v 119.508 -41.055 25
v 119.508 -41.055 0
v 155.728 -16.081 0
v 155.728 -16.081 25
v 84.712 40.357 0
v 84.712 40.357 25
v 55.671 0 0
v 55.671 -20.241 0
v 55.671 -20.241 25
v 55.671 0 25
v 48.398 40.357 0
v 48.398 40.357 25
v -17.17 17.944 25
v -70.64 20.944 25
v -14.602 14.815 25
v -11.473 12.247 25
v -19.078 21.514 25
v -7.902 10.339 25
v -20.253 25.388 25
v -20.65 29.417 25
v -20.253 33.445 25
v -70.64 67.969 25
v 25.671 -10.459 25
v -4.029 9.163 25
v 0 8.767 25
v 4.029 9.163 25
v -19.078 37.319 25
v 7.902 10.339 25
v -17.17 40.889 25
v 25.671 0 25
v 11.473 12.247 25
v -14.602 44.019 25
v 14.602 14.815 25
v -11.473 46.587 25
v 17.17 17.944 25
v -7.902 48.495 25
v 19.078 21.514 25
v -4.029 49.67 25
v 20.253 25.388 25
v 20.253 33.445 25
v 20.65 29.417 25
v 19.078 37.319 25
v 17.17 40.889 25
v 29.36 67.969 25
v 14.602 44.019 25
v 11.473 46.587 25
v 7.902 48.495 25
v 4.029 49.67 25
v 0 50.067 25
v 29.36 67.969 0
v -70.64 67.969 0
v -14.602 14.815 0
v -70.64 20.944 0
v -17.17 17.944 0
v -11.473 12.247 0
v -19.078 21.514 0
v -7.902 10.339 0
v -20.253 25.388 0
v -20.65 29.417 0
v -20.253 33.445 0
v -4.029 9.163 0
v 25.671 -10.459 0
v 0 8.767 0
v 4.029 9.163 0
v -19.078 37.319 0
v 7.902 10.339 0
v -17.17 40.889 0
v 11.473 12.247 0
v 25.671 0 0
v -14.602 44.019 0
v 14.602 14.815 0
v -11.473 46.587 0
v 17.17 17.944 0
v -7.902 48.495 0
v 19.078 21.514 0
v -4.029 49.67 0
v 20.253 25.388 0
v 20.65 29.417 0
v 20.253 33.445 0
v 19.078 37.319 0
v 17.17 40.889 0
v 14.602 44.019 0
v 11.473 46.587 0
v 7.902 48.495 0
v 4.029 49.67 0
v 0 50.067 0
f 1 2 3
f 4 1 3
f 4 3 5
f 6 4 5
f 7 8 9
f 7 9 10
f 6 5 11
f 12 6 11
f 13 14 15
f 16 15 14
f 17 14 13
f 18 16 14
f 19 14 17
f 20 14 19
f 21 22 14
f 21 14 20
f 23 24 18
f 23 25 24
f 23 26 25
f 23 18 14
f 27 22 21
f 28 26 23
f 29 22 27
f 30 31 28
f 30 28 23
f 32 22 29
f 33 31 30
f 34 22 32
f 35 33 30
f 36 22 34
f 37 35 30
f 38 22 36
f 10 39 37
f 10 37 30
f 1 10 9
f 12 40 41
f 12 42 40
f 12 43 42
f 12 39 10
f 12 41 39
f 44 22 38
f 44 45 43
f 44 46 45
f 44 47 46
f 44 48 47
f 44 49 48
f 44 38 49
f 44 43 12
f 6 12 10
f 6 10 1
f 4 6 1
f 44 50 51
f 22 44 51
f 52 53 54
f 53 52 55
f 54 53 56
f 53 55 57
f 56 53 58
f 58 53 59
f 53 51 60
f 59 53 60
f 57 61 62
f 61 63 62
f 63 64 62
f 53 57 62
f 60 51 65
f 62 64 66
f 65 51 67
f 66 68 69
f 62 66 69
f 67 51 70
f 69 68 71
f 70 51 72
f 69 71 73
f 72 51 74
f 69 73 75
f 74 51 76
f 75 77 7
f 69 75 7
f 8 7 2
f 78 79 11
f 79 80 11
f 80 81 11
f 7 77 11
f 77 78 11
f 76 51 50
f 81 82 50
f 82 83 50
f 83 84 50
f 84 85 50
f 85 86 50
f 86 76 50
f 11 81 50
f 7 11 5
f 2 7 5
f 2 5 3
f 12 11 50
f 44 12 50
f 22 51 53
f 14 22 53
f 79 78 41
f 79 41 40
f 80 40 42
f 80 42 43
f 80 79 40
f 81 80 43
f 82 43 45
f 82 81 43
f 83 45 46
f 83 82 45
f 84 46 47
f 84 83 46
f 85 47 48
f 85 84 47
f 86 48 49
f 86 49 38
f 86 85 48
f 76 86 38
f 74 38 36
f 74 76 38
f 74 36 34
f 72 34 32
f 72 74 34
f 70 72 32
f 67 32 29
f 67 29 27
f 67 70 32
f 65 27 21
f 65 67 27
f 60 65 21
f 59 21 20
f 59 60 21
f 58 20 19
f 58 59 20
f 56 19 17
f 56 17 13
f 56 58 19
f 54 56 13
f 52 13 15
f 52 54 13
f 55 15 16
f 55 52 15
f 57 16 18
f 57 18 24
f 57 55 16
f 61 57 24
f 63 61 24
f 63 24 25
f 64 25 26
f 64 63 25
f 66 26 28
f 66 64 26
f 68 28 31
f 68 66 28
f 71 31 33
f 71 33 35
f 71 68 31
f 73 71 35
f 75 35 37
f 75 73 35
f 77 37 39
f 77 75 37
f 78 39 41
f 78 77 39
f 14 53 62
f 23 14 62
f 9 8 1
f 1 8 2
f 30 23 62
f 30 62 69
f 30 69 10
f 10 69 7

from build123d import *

# Parameters (mm, degrees)
F0_R     = 20.650095
F1_DEPTH = 25
F2_W     = 30
F2_H     = 32.013418
F3_DEPTH = 25


with BuildPart() as f1:
    # F0 (on Top) → F1 (new body)
    with BuildSketch(Plane.XY):
        Polygon((29.359795, 67.968812), (-70.640205, 67.968812), (-70.640205, 20.943799), (119.507518, -41.054939), (155.728, -16.081285), (84.712092, 40.356558), (48.398163, 40.356558), align=None)
        with Locations((0, 29.416777)):
            Circle(F0_R, mode=Mode.SUBTRACT)
    extrude(amount=F1_DEPTH)

    # F2 (on Top) → F3 (cut)
    with BuildSketch(Plane.XY):
        with Locations((40.671138, -16.006709)):
            Rectangle(F2_W, F2_H)
    extrude(amount=F3_DEPTH, mode=Mode.SUBTRACT)


solid = f1.part
